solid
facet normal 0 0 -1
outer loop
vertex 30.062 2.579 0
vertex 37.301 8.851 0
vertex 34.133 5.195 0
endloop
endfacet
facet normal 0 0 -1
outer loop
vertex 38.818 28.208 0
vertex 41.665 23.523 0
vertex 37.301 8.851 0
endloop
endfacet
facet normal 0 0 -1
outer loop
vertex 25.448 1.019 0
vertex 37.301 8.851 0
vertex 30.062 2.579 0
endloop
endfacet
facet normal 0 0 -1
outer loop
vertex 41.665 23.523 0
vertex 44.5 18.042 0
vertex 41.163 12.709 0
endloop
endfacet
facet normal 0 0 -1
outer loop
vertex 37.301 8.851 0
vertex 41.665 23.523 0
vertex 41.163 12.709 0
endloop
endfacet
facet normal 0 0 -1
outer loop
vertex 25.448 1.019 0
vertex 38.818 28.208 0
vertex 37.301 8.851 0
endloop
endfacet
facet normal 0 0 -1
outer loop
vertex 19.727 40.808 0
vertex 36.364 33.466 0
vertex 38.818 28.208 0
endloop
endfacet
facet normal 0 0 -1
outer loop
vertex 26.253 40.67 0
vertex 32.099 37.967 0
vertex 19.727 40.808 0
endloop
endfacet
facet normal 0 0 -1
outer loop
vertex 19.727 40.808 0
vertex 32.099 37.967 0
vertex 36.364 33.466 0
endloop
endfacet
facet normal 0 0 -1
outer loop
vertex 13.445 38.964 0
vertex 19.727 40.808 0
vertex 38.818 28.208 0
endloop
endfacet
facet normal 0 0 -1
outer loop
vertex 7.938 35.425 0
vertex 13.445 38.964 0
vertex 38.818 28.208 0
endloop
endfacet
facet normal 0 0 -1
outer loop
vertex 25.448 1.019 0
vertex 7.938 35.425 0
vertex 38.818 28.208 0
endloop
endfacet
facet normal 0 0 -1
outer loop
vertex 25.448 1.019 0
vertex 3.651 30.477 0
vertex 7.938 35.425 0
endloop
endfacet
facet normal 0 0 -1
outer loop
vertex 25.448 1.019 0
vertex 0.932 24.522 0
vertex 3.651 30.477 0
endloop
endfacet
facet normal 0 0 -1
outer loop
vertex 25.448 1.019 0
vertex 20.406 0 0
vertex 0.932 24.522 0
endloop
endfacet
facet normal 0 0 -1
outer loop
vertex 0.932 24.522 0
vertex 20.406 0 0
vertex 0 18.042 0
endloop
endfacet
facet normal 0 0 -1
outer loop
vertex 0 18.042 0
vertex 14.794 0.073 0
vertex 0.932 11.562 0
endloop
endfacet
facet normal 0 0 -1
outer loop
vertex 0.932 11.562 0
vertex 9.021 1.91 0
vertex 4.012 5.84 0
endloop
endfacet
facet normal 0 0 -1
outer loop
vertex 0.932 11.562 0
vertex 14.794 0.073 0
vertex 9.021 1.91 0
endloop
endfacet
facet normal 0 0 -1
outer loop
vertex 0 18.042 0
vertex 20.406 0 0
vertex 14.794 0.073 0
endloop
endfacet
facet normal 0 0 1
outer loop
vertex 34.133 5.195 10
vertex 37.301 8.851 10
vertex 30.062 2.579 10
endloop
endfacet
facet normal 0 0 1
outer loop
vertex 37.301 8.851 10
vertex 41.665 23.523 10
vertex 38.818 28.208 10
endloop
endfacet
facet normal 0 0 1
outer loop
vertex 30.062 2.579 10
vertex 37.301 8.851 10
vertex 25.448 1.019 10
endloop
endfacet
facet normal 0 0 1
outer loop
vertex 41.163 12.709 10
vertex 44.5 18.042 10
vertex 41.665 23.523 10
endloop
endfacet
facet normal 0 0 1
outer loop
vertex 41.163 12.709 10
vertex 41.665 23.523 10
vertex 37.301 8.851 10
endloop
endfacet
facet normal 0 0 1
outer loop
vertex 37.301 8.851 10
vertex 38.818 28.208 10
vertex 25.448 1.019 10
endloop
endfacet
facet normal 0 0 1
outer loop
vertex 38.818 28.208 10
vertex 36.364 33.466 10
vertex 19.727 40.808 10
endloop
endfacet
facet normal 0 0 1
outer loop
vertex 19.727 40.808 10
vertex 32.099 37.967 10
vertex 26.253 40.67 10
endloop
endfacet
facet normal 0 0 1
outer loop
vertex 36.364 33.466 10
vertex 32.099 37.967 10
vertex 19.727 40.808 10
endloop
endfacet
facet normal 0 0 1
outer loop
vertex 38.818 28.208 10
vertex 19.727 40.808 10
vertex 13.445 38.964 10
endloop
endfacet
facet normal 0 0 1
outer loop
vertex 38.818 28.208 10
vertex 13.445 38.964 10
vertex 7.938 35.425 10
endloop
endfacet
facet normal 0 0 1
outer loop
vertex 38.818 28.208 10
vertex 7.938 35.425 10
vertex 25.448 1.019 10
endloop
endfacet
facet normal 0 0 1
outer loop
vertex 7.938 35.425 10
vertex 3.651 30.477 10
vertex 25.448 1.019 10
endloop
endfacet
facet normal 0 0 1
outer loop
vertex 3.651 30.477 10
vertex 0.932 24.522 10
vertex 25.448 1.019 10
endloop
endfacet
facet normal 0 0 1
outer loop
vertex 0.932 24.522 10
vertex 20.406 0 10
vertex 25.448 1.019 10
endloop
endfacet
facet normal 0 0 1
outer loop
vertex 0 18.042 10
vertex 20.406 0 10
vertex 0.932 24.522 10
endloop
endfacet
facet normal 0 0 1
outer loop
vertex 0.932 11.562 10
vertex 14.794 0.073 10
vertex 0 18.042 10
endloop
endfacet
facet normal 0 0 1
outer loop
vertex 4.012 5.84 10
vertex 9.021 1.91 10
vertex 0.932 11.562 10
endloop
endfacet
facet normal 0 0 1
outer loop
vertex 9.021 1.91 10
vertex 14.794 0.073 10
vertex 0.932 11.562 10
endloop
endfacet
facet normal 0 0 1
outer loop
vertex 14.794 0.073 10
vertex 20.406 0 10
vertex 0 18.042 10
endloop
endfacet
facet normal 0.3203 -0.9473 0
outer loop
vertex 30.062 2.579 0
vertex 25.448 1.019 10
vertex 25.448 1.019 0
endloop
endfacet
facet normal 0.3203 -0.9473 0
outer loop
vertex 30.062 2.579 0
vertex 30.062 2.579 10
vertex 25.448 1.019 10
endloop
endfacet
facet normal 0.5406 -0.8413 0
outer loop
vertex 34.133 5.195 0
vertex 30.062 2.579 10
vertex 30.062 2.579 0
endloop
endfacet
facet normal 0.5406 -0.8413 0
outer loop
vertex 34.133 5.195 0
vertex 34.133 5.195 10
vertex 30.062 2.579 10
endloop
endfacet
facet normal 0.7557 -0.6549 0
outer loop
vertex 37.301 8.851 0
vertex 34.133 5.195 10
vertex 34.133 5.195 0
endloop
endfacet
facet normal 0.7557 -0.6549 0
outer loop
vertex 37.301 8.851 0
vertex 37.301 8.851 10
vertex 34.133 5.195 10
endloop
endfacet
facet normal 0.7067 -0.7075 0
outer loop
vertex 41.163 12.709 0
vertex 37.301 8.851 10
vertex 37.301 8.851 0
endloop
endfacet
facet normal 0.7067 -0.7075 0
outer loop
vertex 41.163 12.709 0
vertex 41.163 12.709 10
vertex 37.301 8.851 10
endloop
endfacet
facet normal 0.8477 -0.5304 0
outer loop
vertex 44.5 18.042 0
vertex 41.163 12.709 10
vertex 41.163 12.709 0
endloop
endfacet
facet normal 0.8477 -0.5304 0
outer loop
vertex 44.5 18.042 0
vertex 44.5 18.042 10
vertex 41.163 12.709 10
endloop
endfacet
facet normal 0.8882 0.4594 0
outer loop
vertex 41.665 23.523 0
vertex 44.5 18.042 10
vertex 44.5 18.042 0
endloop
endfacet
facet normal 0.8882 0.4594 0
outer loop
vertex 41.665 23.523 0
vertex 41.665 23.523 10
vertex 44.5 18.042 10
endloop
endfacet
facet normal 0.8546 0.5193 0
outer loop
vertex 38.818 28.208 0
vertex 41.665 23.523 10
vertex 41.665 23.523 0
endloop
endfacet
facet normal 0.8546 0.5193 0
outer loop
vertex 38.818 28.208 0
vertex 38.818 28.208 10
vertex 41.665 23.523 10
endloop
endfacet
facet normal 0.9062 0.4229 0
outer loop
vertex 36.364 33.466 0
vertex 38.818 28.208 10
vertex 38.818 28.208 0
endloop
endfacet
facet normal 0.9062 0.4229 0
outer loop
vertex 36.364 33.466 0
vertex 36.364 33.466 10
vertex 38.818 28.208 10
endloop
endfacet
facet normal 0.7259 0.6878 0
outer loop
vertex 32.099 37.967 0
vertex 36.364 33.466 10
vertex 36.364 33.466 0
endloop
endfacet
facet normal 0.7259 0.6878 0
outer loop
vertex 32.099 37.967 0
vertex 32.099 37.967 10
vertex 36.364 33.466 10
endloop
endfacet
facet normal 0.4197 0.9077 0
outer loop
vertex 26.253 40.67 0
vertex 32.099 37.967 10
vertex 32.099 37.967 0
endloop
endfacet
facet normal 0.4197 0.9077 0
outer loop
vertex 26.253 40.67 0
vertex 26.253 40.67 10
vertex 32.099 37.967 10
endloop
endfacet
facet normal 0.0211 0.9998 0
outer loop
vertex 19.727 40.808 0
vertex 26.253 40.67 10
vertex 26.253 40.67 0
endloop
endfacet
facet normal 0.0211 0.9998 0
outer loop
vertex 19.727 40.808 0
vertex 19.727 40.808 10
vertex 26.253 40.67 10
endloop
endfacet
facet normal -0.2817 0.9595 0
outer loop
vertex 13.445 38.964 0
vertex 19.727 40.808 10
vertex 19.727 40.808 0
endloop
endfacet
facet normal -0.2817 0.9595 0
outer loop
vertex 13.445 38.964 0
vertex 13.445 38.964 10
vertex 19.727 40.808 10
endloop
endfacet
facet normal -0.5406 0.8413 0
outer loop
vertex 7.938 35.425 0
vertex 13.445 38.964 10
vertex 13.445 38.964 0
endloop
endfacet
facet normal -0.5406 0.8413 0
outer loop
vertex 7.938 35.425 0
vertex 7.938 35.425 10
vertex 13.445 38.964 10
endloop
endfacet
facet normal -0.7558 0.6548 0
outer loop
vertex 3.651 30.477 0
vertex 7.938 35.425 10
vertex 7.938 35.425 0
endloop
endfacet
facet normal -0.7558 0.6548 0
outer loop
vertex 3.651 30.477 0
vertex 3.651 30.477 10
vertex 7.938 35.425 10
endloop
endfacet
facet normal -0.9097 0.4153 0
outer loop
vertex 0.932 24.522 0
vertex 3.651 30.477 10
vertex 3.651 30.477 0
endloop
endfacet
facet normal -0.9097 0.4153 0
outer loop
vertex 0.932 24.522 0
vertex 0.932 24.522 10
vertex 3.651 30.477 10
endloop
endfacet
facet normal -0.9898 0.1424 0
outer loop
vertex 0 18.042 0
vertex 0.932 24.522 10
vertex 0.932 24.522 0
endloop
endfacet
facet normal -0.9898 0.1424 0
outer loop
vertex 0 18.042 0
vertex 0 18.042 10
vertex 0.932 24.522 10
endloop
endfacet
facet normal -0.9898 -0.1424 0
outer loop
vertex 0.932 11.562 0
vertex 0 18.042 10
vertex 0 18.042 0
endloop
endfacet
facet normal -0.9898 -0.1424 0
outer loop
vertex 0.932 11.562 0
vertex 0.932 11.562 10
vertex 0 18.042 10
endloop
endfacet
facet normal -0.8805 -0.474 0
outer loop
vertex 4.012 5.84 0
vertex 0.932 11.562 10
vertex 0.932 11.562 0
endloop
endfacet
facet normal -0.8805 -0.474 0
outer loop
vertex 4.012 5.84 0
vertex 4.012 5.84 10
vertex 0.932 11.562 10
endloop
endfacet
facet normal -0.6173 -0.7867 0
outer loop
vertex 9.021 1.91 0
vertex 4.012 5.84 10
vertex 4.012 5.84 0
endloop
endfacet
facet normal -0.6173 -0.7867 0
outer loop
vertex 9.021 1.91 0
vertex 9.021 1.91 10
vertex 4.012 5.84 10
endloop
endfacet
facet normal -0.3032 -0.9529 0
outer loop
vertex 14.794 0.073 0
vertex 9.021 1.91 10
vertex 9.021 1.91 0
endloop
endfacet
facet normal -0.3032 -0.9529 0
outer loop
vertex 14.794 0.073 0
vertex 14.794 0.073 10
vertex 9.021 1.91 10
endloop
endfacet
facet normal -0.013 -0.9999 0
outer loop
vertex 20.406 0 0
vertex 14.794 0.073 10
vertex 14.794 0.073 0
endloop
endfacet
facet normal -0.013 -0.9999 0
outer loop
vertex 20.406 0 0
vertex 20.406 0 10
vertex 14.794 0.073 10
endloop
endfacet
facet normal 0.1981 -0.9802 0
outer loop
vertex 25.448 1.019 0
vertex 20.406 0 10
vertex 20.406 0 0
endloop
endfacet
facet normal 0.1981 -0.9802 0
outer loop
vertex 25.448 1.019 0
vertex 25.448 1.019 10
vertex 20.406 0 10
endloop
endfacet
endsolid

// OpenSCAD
$fn = 32;

// ----------------------------------------------------------------------
// Cam disc: base radius 17.0 mm, lift 6.0 mm, 22 profile points
// ----------------------------------------------------------------------

// --- parameters (mm) ---
profile_height = 10;      // extrusion height
profile_points = 22;      // points of the closed outline

profile = [[44.5, 18.042], [41.665, 23.523], [38.818, 28.208], [36.364, 33.466], [32.099, 37.967], [26.253, 40.67], [19.727, 40.808], [13.445, 38.964], [7.938, 35.425], [3.651, 30.477], [0.932, 24.522], [0, 18.042], [0.932, 11.562], [4.012, 5.84], [9.021, 1.91], [14.794, 0.073], [20.406, 0], [25.448, 1.019], [30.062, 2.579], [34.133, 5.195], [37.301, 8.851], [41.163, 12.709]];  // single closed polygon, 22 points, counter clockwise

// --- the one profile operation ---
linear_extrude(height = profile_height) polygon(points = profile);
